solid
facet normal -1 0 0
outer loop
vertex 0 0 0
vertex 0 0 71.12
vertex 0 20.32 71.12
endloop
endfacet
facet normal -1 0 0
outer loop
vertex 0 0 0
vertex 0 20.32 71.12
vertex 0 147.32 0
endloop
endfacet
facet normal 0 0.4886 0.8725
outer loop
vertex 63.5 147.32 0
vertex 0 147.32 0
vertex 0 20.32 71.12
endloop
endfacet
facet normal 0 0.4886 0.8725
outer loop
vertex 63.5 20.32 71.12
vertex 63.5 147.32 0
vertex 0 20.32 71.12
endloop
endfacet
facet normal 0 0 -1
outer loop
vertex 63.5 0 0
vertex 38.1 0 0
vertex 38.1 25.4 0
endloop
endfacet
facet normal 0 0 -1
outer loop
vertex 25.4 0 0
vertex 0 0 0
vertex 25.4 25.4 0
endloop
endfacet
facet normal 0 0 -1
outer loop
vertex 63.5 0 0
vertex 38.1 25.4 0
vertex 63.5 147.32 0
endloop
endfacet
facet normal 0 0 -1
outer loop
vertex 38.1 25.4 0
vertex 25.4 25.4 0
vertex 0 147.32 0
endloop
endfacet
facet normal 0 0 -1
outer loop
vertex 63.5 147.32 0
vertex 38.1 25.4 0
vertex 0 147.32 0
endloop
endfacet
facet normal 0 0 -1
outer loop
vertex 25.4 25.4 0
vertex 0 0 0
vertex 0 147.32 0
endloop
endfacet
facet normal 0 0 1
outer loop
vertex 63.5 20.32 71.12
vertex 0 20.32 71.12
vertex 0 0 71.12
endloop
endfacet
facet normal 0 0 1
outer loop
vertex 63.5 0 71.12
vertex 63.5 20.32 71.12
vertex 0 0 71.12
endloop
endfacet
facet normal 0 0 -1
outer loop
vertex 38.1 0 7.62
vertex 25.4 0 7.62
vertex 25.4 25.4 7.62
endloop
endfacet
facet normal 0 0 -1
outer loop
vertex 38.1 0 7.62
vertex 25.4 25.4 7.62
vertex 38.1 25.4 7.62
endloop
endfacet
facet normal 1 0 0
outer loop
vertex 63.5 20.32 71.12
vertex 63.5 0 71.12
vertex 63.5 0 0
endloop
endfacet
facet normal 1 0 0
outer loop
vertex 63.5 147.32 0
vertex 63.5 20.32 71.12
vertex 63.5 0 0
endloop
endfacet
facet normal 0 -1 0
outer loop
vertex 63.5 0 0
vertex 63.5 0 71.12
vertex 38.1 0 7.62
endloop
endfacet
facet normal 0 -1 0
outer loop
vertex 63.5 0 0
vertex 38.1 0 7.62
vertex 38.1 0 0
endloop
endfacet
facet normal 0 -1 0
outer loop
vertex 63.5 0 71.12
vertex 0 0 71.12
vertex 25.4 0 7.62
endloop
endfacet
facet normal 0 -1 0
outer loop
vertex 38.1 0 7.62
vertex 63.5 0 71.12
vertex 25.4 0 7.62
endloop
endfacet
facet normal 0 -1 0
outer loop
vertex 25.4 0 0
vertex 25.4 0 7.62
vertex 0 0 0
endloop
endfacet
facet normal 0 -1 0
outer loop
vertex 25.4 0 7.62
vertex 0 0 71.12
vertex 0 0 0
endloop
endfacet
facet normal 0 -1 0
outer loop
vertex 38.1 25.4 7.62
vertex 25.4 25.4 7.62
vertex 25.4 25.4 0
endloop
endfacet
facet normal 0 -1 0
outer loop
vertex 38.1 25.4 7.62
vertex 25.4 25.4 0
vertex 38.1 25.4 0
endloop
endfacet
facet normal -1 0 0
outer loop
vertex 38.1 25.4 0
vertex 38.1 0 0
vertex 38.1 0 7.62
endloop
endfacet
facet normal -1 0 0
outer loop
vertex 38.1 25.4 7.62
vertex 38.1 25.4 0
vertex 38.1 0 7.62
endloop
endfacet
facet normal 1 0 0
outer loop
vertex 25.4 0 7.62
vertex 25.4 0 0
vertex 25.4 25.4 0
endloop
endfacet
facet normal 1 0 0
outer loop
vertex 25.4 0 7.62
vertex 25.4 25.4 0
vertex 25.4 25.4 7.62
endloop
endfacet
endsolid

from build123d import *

# Parameters (mm, degrees)
F1_DEPTH = 63.5
F2_W     = 12.7
F2_H     = 7.62
F3_DEPTH = 25.4


with BuildPart() as f1:
    # F0 (on Right) → F1 (new body)
    with BuildSketch(Plane.YZ):
        Polygon((0, 71.12), (0, 0), (147.32, 0), (20.32, 71.12), align=None)
    extrude(amount=F1_DEPTH)

    # F2 (on Front) → F3 (cut)
    with BuildSketch(Plane.XZ):
        with Locations((31.75, 3.81)):
            Rectangle(F2_W, F2_H)
    extrude(amount=-F3_DEPTH, mode=Mode.SUBTRACT)


solid = f1.part
